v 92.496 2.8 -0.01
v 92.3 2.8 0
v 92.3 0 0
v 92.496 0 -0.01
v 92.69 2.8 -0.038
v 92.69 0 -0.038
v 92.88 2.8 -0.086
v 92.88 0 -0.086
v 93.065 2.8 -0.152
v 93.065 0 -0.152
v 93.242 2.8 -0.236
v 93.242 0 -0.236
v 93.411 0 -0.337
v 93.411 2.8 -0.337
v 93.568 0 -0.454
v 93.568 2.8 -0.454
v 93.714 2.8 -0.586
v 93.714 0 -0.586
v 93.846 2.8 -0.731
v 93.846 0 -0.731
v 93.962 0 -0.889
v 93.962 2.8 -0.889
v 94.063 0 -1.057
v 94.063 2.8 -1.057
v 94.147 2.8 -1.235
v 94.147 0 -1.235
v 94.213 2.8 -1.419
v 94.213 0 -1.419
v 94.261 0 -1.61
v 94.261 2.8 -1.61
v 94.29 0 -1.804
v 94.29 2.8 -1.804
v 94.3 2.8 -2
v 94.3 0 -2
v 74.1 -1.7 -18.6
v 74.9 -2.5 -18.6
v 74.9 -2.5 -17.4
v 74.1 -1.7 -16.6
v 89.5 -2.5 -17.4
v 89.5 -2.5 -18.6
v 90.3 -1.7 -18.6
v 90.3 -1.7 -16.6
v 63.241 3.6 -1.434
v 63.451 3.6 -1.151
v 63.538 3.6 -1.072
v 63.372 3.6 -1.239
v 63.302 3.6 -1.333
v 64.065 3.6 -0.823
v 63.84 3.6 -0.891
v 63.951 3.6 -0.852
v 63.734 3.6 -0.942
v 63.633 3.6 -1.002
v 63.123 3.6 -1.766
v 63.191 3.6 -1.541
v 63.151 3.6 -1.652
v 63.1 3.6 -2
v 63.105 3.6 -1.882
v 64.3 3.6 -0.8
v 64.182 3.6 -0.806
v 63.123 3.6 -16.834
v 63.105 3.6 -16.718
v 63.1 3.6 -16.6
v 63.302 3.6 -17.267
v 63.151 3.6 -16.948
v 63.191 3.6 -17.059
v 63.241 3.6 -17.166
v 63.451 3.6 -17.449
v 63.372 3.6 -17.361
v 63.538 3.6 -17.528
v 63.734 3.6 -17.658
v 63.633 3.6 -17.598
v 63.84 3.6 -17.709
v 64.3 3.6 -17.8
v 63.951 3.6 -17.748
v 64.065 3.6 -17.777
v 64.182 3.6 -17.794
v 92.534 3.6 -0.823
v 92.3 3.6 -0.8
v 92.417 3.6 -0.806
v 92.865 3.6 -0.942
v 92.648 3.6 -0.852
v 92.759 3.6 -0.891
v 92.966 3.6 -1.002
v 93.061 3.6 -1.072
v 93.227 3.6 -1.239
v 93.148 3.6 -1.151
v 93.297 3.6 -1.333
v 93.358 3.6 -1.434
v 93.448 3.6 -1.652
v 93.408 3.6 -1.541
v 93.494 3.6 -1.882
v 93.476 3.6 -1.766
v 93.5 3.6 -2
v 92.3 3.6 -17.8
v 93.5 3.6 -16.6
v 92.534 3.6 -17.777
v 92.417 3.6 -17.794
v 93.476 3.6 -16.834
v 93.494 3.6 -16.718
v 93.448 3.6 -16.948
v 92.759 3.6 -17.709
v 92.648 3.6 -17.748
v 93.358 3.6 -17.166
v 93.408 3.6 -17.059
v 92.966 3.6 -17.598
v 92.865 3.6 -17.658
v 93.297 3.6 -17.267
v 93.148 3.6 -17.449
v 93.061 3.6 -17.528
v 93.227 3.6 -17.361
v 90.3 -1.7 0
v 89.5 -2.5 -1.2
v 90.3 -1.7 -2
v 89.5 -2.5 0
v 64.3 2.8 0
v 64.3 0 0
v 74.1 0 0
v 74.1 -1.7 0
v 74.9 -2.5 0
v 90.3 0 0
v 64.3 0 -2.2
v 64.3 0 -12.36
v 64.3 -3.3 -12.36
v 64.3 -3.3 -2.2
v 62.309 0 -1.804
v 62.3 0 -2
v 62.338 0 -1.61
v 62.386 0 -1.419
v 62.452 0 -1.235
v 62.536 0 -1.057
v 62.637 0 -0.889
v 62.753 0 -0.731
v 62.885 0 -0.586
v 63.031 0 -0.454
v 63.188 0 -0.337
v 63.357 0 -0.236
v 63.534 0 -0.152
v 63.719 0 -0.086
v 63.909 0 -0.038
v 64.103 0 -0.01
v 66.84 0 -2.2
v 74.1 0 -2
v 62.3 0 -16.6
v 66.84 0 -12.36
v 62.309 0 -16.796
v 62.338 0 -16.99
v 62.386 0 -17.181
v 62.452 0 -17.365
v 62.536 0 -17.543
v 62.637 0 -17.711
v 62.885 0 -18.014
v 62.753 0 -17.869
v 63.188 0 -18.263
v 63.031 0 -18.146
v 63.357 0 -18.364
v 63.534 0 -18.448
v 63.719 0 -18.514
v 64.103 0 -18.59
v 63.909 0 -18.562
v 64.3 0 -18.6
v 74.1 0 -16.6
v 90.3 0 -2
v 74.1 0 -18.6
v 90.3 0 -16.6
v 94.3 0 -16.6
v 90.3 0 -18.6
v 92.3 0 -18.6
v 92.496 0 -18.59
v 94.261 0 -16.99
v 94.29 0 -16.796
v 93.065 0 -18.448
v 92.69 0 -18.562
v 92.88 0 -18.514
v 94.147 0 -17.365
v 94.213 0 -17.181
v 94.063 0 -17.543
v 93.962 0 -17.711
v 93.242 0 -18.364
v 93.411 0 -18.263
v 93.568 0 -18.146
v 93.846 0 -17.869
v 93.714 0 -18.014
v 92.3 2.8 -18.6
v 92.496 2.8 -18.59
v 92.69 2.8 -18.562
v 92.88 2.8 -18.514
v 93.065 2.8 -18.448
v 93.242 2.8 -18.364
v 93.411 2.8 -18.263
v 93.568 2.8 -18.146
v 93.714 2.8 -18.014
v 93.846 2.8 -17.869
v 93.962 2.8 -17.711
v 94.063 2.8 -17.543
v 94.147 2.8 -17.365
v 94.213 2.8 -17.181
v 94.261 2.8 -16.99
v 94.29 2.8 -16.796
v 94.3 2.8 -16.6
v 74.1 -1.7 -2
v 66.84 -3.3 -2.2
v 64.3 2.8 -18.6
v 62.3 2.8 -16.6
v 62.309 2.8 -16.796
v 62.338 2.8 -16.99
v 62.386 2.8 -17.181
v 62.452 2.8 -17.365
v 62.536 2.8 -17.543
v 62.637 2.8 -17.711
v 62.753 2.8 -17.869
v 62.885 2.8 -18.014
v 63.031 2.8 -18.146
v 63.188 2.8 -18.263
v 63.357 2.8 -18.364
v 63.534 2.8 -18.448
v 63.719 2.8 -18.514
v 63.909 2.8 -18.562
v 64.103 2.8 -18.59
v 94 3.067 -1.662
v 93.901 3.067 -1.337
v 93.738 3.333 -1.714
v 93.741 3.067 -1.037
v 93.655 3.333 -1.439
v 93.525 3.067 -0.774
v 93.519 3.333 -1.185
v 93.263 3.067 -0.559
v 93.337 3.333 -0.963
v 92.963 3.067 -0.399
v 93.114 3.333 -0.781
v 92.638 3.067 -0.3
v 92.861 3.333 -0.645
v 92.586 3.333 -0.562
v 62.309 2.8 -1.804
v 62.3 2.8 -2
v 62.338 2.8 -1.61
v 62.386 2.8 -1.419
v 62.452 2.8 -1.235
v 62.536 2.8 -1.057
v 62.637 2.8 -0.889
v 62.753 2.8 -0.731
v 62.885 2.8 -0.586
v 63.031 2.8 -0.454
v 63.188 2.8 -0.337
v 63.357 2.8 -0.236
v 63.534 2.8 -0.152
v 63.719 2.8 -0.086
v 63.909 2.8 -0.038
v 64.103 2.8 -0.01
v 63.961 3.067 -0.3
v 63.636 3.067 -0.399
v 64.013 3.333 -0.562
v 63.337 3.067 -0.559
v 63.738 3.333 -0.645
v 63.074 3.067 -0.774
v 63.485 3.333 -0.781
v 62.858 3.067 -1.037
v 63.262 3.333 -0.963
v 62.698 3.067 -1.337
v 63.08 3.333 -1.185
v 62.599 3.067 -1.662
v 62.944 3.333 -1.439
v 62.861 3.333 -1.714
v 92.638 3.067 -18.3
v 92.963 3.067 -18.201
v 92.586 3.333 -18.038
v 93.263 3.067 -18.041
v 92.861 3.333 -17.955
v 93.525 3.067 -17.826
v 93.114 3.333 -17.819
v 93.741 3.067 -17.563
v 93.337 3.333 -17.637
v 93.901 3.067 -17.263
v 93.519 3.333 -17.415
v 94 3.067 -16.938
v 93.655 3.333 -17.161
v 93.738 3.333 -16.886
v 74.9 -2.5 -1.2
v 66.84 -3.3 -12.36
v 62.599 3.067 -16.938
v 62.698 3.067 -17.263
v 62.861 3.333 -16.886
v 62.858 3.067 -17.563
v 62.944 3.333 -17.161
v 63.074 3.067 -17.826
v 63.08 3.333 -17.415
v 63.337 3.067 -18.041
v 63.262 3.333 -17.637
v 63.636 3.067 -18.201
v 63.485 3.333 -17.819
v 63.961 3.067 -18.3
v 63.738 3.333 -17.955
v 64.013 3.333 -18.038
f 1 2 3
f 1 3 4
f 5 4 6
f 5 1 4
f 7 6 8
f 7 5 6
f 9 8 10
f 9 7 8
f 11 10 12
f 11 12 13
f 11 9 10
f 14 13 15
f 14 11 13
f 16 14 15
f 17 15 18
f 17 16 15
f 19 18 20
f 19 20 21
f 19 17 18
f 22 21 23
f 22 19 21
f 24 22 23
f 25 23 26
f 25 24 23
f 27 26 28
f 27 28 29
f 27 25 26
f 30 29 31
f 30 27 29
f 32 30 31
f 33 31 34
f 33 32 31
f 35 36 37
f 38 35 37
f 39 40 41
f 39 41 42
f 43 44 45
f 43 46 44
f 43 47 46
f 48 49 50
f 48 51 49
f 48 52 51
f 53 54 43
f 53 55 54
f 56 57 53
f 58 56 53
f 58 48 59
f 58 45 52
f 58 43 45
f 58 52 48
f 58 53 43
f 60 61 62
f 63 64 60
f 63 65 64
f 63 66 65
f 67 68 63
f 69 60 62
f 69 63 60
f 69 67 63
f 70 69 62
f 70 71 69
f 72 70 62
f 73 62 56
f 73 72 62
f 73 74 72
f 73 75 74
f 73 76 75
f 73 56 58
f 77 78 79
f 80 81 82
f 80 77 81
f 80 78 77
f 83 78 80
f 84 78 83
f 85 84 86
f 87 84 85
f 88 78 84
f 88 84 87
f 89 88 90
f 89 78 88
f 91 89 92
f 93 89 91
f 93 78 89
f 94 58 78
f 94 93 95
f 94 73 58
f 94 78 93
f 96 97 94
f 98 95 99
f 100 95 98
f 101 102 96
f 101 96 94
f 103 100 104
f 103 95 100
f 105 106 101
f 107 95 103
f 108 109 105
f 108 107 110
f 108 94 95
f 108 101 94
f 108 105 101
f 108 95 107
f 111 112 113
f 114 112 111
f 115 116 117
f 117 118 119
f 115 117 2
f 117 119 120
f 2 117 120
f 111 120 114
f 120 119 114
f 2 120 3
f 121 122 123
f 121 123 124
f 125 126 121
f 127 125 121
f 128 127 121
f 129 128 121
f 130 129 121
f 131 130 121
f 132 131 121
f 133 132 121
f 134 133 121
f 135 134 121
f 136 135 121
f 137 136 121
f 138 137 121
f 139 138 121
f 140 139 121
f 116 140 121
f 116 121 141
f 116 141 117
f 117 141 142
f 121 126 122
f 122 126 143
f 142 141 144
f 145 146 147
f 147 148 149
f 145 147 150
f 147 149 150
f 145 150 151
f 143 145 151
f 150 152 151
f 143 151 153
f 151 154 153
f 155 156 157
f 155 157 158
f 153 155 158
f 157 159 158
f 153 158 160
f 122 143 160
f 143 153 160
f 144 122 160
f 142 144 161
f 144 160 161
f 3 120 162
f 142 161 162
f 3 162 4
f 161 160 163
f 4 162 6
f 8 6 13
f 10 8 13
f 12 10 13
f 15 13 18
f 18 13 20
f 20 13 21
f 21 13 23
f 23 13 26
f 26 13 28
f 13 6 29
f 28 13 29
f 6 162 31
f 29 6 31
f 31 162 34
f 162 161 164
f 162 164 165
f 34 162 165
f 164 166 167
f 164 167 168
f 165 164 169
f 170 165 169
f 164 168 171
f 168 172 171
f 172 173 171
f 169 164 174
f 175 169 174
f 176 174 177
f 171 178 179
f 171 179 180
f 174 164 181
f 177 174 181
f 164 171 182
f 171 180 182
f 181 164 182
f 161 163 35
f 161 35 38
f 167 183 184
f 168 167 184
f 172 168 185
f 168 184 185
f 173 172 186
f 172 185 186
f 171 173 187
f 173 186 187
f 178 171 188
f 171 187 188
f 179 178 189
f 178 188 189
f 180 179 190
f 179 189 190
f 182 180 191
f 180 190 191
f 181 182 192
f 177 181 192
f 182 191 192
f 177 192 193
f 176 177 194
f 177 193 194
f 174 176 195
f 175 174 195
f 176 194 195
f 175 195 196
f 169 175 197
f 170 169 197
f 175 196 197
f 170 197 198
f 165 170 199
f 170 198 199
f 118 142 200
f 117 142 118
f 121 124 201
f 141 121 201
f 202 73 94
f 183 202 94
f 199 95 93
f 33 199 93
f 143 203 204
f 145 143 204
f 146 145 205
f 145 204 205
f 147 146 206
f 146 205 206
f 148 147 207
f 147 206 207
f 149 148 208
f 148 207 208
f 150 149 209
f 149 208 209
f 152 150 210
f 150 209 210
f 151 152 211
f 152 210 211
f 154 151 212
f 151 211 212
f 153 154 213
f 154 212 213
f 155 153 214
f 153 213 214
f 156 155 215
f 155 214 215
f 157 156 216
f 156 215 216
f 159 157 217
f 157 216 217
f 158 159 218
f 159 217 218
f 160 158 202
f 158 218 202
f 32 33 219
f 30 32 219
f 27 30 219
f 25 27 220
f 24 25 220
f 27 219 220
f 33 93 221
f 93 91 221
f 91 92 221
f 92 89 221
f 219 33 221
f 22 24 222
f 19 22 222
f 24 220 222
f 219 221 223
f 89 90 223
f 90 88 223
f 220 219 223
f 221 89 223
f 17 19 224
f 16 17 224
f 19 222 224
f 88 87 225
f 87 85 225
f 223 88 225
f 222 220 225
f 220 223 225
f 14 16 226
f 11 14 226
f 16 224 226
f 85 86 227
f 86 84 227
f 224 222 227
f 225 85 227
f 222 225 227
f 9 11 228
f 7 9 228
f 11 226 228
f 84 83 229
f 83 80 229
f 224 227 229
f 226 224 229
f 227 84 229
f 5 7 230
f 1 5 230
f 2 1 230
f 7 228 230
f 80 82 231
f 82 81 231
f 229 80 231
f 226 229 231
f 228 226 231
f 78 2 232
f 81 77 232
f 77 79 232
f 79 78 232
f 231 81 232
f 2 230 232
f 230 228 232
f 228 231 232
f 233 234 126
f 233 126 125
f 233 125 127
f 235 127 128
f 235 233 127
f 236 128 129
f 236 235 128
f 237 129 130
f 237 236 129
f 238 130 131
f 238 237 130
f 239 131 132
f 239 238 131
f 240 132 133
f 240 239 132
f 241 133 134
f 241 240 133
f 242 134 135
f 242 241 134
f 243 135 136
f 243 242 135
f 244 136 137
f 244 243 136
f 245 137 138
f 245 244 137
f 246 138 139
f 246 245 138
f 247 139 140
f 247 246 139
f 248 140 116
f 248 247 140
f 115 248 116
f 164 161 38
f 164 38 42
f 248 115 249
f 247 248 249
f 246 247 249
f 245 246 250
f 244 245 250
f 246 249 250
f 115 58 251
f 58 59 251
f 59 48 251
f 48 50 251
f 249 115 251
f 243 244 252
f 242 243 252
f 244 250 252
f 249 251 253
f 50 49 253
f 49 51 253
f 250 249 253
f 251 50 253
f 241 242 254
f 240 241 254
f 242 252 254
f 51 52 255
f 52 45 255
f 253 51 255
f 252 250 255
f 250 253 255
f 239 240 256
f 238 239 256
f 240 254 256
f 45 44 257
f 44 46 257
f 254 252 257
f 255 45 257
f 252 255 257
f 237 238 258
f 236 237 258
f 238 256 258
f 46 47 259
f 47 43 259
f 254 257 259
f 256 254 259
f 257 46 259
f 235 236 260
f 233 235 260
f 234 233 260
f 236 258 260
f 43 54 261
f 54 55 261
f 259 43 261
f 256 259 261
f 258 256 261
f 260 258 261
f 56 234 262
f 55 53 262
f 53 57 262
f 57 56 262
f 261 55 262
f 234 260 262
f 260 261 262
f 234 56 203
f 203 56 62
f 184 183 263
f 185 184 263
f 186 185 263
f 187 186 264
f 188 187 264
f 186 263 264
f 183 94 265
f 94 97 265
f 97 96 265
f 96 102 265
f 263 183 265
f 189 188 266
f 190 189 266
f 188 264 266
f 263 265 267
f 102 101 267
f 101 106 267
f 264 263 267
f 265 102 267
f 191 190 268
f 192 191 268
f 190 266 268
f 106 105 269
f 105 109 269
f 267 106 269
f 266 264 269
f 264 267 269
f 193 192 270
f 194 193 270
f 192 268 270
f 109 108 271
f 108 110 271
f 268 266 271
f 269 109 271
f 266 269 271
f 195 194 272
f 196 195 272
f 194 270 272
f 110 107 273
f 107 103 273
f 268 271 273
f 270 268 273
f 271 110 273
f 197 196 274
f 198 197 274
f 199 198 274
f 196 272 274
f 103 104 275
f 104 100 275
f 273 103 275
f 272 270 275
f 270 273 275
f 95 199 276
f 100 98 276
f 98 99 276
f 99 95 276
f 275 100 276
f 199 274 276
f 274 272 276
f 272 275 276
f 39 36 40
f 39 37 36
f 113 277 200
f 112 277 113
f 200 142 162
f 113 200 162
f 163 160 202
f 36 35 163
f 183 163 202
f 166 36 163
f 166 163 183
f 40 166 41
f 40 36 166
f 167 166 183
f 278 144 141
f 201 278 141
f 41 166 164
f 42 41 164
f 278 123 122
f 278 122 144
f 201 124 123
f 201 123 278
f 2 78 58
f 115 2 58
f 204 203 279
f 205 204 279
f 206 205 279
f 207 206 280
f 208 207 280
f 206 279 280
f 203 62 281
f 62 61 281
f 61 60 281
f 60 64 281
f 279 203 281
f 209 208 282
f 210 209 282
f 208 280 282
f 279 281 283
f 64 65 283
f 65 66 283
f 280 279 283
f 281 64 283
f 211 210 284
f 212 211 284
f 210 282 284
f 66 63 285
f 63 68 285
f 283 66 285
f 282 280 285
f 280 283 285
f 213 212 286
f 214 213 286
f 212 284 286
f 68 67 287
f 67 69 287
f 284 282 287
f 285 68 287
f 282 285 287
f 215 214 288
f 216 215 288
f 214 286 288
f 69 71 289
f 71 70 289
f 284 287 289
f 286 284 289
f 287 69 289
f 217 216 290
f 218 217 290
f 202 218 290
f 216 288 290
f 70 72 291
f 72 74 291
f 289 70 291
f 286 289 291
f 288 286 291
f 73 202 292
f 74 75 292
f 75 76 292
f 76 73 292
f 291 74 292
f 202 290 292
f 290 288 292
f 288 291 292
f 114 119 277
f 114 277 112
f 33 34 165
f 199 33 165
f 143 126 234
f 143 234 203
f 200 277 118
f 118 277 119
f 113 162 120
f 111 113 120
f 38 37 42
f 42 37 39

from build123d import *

# Parameters (mm, degrees)
SKETCH_1_W      = 32
SKETCH_1_H      = 18.6
EXTRUDE_1_DEPTH = 3.6
SKETCH_2_W      = 2.54
SKETCH_2_H      = 10.16
EXTRUDE_2_DEPTH = 3.3
SKETCH_3_W      = 16.2
SKETCH_3_H      = 2
EXTRUDE_3_DEPTH = 2.5
FILLET_1_R      = 2
CHAMFER_1_SIZE  = 0.8
CHAMFER_2_SIZE  = 0.8


with BuildPart() as part:
    # 草图1 → 凸台-拉伸1 (new body)
    with BuildSketch(Plane(origin=(0, 0, 0), x_dir=(1, 0, 0), z_dir=(0, 1, 0))):
        with Locations((78.299519248, 9.3)):
            Rectangle(SKETCH_1_W, SKETCH_1_H)
    extrude(amount=EXTRUDE_1_DEPTH)

    # 草图2 → 凸台-拉伸2 (add)
    with BuildSketch(Plane.XZ):
        with Locations((65.569519248, -7.28)):
            Rectangle(SKETCH_2_W, SKETCH_2_H)
    extrude(amount=EXTRUDE_2_DEPTH)

    # 草图3 → 凸台-拉伸3 (add)
    with BuildSketch(Plane.XZ):
        with Locations((82.199519248, -17.6)):
            Rectangle(SKETCH_3_W, SKETCH_3_H)
        with Locations((82.199519248, -1)):
            Rectangle(SKETCH_3_W, SKETCH_3_H)
    extrude(amount=EXTRUDE_3_DEPTH)

    # 圆角1
    fillet_1_edges = [part.edges().sort_by_distance(p)[0] for p in [
        (62.299519248, 1.8, -18.6),
        (94.299519248, 1.8, -18.6),
        (94.299519248, 1.8, 0),
        (62.299519248, 1.8, 0),
    ]]
    fillet(fillet_1_edges, radius=FILLET_1_R)

    # 倒角1
    chamfer_1_edges = [part.edges().sort_by_distance(p)[0] for p in [
        (62.299519248, 3.6, -9.3),
        (78.299519248, 3.6, -18.6),
        (78.299519248, 3.6, 0),
        (94.299519248, 3.6, -9.3),
        (62.885305686, 3.6, -0.585786438),
        (93.71373281, 3.6, -0.585786438),
        (93.71373281, 3.6, -18.014213562),
        (62.885305686, 3.6, -18.014213562),
    ]]
    chamfer(chamfer_1_edges, length=CHAMFER_1_SIZE)

    # 倒角2
    chamfer_2_edges = [part.edges().sort_by_distance(p)[0] for p in [
        (90.299519248, -2.5, -17.6),
        (82.199519248, -2.5, -16.6),
        (74.099519248, -2.5, -17.6),
        (82.199519248, -2.5, -2),
        (90.299519248, -2.5, -1),
        (74.099519248, -2.5, -1),
    ]]
    chamfer(chamfer_2_edges, length=CHAMFER_2_SIZE)


solid = part.part
